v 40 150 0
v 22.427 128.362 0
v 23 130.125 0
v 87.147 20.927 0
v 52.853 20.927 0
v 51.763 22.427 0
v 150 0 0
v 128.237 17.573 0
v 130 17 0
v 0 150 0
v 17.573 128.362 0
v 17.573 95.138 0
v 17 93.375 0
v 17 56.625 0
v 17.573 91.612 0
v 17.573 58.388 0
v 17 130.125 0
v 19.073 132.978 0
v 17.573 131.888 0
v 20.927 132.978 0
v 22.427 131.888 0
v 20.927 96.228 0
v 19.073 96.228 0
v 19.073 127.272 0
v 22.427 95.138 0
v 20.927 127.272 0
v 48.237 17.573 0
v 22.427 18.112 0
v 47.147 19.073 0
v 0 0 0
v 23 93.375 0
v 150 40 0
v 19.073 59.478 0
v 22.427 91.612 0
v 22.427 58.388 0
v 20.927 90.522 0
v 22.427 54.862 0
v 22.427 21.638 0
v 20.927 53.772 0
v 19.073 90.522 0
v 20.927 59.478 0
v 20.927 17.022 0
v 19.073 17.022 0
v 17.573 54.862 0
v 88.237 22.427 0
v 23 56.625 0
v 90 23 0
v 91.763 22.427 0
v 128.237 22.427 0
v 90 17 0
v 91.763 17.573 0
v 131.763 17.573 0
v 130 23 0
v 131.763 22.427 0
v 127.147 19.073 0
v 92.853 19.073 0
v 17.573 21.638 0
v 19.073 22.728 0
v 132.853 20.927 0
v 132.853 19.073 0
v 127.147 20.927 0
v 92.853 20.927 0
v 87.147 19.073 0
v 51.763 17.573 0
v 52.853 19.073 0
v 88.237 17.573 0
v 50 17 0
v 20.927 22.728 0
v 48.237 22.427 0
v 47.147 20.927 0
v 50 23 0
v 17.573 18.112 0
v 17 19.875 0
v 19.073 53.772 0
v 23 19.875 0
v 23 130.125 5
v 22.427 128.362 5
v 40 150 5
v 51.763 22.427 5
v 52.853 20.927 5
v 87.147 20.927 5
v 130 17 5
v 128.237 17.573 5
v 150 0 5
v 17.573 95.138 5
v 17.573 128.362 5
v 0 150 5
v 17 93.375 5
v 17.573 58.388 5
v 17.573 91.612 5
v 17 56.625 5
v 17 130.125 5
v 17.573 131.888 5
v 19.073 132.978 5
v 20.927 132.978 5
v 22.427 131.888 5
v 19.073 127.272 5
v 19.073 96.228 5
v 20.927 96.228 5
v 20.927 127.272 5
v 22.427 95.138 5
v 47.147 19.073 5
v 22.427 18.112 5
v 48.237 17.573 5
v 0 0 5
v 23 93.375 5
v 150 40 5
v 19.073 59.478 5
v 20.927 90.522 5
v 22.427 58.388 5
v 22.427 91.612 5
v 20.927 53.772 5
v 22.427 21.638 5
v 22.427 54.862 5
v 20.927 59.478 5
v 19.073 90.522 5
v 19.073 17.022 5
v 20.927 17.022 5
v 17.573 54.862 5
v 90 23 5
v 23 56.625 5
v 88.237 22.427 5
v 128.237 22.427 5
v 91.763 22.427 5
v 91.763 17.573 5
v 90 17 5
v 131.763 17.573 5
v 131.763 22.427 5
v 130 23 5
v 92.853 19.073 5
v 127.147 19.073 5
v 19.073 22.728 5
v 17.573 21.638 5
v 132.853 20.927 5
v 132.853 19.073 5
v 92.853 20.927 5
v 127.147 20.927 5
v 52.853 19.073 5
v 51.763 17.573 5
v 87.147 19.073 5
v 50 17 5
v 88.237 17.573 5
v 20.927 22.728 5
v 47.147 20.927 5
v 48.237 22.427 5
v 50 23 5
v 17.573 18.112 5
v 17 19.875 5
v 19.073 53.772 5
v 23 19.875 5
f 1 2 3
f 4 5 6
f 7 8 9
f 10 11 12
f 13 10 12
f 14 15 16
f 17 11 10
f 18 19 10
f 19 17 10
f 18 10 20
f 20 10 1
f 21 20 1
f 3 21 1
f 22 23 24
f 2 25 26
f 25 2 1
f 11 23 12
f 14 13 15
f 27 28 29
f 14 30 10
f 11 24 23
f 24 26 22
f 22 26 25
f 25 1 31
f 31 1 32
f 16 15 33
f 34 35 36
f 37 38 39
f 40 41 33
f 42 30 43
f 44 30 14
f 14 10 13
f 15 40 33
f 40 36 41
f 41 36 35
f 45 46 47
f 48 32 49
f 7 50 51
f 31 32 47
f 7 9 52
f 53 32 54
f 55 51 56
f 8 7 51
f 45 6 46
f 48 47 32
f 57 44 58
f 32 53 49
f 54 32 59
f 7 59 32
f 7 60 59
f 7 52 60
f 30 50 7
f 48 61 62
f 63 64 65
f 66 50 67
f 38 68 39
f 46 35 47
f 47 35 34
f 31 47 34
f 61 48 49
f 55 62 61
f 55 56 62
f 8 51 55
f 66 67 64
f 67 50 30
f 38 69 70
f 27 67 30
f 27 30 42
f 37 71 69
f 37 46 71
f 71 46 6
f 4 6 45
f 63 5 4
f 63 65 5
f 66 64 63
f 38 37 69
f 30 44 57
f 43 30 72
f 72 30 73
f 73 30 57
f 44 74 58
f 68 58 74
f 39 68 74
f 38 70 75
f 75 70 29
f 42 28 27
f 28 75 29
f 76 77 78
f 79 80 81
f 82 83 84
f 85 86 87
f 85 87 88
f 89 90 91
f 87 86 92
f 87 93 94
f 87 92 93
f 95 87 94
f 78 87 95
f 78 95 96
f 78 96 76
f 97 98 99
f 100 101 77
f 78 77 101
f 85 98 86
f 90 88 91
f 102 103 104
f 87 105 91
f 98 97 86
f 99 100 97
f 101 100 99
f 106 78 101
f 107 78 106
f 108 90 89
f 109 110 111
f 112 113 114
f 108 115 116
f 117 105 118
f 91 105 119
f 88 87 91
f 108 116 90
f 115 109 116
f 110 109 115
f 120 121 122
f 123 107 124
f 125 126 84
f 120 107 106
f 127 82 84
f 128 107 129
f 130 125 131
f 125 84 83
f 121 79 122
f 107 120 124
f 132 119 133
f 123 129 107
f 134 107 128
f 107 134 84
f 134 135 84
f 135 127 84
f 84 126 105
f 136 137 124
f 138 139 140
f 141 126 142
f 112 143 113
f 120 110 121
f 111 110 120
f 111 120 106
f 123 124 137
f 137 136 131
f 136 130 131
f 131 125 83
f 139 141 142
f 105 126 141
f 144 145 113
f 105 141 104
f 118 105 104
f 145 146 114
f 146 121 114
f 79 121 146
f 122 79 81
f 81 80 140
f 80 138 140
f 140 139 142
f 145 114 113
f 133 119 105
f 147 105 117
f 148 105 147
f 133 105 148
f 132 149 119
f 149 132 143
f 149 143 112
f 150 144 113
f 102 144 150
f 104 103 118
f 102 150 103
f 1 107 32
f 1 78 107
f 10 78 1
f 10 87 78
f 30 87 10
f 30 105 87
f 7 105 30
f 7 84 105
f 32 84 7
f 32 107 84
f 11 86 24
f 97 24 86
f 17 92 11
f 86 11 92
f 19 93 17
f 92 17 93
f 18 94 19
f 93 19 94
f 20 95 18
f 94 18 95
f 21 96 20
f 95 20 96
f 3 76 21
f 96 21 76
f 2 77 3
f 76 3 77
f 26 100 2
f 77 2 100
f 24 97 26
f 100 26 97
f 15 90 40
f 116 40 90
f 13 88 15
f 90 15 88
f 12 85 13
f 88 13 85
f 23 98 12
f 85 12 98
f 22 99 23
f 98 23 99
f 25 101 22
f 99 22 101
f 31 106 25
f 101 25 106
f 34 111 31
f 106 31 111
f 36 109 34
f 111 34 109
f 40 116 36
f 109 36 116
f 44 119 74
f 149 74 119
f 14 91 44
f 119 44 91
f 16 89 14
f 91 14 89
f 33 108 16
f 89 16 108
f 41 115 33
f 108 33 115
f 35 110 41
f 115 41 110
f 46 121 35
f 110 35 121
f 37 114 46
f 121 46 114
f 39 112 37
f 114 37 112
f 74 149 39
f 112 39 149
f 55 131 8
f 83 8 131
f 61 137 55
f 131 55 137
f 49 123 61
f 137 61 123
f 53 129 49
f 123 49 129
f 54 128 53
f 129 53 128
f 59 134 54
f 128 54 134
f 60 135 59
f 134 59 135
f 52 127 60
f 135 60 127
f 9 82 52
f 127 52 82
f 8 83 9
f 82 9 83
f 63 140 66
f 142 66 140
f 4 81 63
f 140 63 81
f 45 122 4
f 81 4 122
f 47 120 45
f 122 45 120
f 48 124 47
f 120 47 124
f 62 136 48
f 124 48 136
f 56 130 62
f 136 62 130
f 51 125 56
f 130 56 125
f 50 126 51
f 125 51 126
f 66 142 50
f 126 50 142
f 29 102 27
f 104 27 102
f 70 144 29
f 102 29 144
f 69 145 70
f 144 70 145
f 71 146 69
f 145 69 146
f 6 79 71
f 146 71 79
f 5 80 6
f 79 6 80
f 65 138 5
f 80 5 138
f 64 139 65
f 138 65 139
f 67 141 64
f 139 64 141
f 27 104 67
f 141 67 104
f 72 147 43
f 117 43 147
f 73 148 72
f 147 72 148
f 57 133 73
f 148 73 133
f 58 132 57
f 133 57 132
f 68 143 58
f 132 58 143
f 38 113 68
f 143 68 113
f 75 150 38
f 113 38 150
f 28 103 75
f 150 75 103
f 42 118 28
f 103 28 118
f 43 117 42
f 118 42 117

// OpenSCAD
// file: bracket.scad
module bracket(h, l, a, b) {
	linear_extrude(h) {
		difference() {
			polygon([[0,0], [l, 0], [l, a], [b, l], [0, l]]);
			children(0);
			rotate([0, 180, -90]) children(1);
		}
	}
}

module bracket_holes(width, length, offset_, diameter, holes, rows=1) {
	between_rows = (width)/(rows);
	between_holes = (length - offset_*2)/(holes);
	wcenter = (width-((rows-1)*between_rows))/2;
	lcenter = (length-((holes-1)*between_holes))/2;
	for (r = [0:rows-1]) {
		row = wcenter + r*between_rows;
		for (i = [0:holes-1]) {
			translate([row, lcenter + i*between_holes]) circle(r=diameter/2);
		}
	}
}
// main file
use <bracket.scad>;

module bracket_4040(h=5) {
	bracket(h, 150, 40, 40) {
		bracket_holes(40, 150, 1.5, 6, 4);
		translate([0, 15, 0]) bracket_holes(40, 150, 15, 6, 3);
	}
}
bracket_4040();
